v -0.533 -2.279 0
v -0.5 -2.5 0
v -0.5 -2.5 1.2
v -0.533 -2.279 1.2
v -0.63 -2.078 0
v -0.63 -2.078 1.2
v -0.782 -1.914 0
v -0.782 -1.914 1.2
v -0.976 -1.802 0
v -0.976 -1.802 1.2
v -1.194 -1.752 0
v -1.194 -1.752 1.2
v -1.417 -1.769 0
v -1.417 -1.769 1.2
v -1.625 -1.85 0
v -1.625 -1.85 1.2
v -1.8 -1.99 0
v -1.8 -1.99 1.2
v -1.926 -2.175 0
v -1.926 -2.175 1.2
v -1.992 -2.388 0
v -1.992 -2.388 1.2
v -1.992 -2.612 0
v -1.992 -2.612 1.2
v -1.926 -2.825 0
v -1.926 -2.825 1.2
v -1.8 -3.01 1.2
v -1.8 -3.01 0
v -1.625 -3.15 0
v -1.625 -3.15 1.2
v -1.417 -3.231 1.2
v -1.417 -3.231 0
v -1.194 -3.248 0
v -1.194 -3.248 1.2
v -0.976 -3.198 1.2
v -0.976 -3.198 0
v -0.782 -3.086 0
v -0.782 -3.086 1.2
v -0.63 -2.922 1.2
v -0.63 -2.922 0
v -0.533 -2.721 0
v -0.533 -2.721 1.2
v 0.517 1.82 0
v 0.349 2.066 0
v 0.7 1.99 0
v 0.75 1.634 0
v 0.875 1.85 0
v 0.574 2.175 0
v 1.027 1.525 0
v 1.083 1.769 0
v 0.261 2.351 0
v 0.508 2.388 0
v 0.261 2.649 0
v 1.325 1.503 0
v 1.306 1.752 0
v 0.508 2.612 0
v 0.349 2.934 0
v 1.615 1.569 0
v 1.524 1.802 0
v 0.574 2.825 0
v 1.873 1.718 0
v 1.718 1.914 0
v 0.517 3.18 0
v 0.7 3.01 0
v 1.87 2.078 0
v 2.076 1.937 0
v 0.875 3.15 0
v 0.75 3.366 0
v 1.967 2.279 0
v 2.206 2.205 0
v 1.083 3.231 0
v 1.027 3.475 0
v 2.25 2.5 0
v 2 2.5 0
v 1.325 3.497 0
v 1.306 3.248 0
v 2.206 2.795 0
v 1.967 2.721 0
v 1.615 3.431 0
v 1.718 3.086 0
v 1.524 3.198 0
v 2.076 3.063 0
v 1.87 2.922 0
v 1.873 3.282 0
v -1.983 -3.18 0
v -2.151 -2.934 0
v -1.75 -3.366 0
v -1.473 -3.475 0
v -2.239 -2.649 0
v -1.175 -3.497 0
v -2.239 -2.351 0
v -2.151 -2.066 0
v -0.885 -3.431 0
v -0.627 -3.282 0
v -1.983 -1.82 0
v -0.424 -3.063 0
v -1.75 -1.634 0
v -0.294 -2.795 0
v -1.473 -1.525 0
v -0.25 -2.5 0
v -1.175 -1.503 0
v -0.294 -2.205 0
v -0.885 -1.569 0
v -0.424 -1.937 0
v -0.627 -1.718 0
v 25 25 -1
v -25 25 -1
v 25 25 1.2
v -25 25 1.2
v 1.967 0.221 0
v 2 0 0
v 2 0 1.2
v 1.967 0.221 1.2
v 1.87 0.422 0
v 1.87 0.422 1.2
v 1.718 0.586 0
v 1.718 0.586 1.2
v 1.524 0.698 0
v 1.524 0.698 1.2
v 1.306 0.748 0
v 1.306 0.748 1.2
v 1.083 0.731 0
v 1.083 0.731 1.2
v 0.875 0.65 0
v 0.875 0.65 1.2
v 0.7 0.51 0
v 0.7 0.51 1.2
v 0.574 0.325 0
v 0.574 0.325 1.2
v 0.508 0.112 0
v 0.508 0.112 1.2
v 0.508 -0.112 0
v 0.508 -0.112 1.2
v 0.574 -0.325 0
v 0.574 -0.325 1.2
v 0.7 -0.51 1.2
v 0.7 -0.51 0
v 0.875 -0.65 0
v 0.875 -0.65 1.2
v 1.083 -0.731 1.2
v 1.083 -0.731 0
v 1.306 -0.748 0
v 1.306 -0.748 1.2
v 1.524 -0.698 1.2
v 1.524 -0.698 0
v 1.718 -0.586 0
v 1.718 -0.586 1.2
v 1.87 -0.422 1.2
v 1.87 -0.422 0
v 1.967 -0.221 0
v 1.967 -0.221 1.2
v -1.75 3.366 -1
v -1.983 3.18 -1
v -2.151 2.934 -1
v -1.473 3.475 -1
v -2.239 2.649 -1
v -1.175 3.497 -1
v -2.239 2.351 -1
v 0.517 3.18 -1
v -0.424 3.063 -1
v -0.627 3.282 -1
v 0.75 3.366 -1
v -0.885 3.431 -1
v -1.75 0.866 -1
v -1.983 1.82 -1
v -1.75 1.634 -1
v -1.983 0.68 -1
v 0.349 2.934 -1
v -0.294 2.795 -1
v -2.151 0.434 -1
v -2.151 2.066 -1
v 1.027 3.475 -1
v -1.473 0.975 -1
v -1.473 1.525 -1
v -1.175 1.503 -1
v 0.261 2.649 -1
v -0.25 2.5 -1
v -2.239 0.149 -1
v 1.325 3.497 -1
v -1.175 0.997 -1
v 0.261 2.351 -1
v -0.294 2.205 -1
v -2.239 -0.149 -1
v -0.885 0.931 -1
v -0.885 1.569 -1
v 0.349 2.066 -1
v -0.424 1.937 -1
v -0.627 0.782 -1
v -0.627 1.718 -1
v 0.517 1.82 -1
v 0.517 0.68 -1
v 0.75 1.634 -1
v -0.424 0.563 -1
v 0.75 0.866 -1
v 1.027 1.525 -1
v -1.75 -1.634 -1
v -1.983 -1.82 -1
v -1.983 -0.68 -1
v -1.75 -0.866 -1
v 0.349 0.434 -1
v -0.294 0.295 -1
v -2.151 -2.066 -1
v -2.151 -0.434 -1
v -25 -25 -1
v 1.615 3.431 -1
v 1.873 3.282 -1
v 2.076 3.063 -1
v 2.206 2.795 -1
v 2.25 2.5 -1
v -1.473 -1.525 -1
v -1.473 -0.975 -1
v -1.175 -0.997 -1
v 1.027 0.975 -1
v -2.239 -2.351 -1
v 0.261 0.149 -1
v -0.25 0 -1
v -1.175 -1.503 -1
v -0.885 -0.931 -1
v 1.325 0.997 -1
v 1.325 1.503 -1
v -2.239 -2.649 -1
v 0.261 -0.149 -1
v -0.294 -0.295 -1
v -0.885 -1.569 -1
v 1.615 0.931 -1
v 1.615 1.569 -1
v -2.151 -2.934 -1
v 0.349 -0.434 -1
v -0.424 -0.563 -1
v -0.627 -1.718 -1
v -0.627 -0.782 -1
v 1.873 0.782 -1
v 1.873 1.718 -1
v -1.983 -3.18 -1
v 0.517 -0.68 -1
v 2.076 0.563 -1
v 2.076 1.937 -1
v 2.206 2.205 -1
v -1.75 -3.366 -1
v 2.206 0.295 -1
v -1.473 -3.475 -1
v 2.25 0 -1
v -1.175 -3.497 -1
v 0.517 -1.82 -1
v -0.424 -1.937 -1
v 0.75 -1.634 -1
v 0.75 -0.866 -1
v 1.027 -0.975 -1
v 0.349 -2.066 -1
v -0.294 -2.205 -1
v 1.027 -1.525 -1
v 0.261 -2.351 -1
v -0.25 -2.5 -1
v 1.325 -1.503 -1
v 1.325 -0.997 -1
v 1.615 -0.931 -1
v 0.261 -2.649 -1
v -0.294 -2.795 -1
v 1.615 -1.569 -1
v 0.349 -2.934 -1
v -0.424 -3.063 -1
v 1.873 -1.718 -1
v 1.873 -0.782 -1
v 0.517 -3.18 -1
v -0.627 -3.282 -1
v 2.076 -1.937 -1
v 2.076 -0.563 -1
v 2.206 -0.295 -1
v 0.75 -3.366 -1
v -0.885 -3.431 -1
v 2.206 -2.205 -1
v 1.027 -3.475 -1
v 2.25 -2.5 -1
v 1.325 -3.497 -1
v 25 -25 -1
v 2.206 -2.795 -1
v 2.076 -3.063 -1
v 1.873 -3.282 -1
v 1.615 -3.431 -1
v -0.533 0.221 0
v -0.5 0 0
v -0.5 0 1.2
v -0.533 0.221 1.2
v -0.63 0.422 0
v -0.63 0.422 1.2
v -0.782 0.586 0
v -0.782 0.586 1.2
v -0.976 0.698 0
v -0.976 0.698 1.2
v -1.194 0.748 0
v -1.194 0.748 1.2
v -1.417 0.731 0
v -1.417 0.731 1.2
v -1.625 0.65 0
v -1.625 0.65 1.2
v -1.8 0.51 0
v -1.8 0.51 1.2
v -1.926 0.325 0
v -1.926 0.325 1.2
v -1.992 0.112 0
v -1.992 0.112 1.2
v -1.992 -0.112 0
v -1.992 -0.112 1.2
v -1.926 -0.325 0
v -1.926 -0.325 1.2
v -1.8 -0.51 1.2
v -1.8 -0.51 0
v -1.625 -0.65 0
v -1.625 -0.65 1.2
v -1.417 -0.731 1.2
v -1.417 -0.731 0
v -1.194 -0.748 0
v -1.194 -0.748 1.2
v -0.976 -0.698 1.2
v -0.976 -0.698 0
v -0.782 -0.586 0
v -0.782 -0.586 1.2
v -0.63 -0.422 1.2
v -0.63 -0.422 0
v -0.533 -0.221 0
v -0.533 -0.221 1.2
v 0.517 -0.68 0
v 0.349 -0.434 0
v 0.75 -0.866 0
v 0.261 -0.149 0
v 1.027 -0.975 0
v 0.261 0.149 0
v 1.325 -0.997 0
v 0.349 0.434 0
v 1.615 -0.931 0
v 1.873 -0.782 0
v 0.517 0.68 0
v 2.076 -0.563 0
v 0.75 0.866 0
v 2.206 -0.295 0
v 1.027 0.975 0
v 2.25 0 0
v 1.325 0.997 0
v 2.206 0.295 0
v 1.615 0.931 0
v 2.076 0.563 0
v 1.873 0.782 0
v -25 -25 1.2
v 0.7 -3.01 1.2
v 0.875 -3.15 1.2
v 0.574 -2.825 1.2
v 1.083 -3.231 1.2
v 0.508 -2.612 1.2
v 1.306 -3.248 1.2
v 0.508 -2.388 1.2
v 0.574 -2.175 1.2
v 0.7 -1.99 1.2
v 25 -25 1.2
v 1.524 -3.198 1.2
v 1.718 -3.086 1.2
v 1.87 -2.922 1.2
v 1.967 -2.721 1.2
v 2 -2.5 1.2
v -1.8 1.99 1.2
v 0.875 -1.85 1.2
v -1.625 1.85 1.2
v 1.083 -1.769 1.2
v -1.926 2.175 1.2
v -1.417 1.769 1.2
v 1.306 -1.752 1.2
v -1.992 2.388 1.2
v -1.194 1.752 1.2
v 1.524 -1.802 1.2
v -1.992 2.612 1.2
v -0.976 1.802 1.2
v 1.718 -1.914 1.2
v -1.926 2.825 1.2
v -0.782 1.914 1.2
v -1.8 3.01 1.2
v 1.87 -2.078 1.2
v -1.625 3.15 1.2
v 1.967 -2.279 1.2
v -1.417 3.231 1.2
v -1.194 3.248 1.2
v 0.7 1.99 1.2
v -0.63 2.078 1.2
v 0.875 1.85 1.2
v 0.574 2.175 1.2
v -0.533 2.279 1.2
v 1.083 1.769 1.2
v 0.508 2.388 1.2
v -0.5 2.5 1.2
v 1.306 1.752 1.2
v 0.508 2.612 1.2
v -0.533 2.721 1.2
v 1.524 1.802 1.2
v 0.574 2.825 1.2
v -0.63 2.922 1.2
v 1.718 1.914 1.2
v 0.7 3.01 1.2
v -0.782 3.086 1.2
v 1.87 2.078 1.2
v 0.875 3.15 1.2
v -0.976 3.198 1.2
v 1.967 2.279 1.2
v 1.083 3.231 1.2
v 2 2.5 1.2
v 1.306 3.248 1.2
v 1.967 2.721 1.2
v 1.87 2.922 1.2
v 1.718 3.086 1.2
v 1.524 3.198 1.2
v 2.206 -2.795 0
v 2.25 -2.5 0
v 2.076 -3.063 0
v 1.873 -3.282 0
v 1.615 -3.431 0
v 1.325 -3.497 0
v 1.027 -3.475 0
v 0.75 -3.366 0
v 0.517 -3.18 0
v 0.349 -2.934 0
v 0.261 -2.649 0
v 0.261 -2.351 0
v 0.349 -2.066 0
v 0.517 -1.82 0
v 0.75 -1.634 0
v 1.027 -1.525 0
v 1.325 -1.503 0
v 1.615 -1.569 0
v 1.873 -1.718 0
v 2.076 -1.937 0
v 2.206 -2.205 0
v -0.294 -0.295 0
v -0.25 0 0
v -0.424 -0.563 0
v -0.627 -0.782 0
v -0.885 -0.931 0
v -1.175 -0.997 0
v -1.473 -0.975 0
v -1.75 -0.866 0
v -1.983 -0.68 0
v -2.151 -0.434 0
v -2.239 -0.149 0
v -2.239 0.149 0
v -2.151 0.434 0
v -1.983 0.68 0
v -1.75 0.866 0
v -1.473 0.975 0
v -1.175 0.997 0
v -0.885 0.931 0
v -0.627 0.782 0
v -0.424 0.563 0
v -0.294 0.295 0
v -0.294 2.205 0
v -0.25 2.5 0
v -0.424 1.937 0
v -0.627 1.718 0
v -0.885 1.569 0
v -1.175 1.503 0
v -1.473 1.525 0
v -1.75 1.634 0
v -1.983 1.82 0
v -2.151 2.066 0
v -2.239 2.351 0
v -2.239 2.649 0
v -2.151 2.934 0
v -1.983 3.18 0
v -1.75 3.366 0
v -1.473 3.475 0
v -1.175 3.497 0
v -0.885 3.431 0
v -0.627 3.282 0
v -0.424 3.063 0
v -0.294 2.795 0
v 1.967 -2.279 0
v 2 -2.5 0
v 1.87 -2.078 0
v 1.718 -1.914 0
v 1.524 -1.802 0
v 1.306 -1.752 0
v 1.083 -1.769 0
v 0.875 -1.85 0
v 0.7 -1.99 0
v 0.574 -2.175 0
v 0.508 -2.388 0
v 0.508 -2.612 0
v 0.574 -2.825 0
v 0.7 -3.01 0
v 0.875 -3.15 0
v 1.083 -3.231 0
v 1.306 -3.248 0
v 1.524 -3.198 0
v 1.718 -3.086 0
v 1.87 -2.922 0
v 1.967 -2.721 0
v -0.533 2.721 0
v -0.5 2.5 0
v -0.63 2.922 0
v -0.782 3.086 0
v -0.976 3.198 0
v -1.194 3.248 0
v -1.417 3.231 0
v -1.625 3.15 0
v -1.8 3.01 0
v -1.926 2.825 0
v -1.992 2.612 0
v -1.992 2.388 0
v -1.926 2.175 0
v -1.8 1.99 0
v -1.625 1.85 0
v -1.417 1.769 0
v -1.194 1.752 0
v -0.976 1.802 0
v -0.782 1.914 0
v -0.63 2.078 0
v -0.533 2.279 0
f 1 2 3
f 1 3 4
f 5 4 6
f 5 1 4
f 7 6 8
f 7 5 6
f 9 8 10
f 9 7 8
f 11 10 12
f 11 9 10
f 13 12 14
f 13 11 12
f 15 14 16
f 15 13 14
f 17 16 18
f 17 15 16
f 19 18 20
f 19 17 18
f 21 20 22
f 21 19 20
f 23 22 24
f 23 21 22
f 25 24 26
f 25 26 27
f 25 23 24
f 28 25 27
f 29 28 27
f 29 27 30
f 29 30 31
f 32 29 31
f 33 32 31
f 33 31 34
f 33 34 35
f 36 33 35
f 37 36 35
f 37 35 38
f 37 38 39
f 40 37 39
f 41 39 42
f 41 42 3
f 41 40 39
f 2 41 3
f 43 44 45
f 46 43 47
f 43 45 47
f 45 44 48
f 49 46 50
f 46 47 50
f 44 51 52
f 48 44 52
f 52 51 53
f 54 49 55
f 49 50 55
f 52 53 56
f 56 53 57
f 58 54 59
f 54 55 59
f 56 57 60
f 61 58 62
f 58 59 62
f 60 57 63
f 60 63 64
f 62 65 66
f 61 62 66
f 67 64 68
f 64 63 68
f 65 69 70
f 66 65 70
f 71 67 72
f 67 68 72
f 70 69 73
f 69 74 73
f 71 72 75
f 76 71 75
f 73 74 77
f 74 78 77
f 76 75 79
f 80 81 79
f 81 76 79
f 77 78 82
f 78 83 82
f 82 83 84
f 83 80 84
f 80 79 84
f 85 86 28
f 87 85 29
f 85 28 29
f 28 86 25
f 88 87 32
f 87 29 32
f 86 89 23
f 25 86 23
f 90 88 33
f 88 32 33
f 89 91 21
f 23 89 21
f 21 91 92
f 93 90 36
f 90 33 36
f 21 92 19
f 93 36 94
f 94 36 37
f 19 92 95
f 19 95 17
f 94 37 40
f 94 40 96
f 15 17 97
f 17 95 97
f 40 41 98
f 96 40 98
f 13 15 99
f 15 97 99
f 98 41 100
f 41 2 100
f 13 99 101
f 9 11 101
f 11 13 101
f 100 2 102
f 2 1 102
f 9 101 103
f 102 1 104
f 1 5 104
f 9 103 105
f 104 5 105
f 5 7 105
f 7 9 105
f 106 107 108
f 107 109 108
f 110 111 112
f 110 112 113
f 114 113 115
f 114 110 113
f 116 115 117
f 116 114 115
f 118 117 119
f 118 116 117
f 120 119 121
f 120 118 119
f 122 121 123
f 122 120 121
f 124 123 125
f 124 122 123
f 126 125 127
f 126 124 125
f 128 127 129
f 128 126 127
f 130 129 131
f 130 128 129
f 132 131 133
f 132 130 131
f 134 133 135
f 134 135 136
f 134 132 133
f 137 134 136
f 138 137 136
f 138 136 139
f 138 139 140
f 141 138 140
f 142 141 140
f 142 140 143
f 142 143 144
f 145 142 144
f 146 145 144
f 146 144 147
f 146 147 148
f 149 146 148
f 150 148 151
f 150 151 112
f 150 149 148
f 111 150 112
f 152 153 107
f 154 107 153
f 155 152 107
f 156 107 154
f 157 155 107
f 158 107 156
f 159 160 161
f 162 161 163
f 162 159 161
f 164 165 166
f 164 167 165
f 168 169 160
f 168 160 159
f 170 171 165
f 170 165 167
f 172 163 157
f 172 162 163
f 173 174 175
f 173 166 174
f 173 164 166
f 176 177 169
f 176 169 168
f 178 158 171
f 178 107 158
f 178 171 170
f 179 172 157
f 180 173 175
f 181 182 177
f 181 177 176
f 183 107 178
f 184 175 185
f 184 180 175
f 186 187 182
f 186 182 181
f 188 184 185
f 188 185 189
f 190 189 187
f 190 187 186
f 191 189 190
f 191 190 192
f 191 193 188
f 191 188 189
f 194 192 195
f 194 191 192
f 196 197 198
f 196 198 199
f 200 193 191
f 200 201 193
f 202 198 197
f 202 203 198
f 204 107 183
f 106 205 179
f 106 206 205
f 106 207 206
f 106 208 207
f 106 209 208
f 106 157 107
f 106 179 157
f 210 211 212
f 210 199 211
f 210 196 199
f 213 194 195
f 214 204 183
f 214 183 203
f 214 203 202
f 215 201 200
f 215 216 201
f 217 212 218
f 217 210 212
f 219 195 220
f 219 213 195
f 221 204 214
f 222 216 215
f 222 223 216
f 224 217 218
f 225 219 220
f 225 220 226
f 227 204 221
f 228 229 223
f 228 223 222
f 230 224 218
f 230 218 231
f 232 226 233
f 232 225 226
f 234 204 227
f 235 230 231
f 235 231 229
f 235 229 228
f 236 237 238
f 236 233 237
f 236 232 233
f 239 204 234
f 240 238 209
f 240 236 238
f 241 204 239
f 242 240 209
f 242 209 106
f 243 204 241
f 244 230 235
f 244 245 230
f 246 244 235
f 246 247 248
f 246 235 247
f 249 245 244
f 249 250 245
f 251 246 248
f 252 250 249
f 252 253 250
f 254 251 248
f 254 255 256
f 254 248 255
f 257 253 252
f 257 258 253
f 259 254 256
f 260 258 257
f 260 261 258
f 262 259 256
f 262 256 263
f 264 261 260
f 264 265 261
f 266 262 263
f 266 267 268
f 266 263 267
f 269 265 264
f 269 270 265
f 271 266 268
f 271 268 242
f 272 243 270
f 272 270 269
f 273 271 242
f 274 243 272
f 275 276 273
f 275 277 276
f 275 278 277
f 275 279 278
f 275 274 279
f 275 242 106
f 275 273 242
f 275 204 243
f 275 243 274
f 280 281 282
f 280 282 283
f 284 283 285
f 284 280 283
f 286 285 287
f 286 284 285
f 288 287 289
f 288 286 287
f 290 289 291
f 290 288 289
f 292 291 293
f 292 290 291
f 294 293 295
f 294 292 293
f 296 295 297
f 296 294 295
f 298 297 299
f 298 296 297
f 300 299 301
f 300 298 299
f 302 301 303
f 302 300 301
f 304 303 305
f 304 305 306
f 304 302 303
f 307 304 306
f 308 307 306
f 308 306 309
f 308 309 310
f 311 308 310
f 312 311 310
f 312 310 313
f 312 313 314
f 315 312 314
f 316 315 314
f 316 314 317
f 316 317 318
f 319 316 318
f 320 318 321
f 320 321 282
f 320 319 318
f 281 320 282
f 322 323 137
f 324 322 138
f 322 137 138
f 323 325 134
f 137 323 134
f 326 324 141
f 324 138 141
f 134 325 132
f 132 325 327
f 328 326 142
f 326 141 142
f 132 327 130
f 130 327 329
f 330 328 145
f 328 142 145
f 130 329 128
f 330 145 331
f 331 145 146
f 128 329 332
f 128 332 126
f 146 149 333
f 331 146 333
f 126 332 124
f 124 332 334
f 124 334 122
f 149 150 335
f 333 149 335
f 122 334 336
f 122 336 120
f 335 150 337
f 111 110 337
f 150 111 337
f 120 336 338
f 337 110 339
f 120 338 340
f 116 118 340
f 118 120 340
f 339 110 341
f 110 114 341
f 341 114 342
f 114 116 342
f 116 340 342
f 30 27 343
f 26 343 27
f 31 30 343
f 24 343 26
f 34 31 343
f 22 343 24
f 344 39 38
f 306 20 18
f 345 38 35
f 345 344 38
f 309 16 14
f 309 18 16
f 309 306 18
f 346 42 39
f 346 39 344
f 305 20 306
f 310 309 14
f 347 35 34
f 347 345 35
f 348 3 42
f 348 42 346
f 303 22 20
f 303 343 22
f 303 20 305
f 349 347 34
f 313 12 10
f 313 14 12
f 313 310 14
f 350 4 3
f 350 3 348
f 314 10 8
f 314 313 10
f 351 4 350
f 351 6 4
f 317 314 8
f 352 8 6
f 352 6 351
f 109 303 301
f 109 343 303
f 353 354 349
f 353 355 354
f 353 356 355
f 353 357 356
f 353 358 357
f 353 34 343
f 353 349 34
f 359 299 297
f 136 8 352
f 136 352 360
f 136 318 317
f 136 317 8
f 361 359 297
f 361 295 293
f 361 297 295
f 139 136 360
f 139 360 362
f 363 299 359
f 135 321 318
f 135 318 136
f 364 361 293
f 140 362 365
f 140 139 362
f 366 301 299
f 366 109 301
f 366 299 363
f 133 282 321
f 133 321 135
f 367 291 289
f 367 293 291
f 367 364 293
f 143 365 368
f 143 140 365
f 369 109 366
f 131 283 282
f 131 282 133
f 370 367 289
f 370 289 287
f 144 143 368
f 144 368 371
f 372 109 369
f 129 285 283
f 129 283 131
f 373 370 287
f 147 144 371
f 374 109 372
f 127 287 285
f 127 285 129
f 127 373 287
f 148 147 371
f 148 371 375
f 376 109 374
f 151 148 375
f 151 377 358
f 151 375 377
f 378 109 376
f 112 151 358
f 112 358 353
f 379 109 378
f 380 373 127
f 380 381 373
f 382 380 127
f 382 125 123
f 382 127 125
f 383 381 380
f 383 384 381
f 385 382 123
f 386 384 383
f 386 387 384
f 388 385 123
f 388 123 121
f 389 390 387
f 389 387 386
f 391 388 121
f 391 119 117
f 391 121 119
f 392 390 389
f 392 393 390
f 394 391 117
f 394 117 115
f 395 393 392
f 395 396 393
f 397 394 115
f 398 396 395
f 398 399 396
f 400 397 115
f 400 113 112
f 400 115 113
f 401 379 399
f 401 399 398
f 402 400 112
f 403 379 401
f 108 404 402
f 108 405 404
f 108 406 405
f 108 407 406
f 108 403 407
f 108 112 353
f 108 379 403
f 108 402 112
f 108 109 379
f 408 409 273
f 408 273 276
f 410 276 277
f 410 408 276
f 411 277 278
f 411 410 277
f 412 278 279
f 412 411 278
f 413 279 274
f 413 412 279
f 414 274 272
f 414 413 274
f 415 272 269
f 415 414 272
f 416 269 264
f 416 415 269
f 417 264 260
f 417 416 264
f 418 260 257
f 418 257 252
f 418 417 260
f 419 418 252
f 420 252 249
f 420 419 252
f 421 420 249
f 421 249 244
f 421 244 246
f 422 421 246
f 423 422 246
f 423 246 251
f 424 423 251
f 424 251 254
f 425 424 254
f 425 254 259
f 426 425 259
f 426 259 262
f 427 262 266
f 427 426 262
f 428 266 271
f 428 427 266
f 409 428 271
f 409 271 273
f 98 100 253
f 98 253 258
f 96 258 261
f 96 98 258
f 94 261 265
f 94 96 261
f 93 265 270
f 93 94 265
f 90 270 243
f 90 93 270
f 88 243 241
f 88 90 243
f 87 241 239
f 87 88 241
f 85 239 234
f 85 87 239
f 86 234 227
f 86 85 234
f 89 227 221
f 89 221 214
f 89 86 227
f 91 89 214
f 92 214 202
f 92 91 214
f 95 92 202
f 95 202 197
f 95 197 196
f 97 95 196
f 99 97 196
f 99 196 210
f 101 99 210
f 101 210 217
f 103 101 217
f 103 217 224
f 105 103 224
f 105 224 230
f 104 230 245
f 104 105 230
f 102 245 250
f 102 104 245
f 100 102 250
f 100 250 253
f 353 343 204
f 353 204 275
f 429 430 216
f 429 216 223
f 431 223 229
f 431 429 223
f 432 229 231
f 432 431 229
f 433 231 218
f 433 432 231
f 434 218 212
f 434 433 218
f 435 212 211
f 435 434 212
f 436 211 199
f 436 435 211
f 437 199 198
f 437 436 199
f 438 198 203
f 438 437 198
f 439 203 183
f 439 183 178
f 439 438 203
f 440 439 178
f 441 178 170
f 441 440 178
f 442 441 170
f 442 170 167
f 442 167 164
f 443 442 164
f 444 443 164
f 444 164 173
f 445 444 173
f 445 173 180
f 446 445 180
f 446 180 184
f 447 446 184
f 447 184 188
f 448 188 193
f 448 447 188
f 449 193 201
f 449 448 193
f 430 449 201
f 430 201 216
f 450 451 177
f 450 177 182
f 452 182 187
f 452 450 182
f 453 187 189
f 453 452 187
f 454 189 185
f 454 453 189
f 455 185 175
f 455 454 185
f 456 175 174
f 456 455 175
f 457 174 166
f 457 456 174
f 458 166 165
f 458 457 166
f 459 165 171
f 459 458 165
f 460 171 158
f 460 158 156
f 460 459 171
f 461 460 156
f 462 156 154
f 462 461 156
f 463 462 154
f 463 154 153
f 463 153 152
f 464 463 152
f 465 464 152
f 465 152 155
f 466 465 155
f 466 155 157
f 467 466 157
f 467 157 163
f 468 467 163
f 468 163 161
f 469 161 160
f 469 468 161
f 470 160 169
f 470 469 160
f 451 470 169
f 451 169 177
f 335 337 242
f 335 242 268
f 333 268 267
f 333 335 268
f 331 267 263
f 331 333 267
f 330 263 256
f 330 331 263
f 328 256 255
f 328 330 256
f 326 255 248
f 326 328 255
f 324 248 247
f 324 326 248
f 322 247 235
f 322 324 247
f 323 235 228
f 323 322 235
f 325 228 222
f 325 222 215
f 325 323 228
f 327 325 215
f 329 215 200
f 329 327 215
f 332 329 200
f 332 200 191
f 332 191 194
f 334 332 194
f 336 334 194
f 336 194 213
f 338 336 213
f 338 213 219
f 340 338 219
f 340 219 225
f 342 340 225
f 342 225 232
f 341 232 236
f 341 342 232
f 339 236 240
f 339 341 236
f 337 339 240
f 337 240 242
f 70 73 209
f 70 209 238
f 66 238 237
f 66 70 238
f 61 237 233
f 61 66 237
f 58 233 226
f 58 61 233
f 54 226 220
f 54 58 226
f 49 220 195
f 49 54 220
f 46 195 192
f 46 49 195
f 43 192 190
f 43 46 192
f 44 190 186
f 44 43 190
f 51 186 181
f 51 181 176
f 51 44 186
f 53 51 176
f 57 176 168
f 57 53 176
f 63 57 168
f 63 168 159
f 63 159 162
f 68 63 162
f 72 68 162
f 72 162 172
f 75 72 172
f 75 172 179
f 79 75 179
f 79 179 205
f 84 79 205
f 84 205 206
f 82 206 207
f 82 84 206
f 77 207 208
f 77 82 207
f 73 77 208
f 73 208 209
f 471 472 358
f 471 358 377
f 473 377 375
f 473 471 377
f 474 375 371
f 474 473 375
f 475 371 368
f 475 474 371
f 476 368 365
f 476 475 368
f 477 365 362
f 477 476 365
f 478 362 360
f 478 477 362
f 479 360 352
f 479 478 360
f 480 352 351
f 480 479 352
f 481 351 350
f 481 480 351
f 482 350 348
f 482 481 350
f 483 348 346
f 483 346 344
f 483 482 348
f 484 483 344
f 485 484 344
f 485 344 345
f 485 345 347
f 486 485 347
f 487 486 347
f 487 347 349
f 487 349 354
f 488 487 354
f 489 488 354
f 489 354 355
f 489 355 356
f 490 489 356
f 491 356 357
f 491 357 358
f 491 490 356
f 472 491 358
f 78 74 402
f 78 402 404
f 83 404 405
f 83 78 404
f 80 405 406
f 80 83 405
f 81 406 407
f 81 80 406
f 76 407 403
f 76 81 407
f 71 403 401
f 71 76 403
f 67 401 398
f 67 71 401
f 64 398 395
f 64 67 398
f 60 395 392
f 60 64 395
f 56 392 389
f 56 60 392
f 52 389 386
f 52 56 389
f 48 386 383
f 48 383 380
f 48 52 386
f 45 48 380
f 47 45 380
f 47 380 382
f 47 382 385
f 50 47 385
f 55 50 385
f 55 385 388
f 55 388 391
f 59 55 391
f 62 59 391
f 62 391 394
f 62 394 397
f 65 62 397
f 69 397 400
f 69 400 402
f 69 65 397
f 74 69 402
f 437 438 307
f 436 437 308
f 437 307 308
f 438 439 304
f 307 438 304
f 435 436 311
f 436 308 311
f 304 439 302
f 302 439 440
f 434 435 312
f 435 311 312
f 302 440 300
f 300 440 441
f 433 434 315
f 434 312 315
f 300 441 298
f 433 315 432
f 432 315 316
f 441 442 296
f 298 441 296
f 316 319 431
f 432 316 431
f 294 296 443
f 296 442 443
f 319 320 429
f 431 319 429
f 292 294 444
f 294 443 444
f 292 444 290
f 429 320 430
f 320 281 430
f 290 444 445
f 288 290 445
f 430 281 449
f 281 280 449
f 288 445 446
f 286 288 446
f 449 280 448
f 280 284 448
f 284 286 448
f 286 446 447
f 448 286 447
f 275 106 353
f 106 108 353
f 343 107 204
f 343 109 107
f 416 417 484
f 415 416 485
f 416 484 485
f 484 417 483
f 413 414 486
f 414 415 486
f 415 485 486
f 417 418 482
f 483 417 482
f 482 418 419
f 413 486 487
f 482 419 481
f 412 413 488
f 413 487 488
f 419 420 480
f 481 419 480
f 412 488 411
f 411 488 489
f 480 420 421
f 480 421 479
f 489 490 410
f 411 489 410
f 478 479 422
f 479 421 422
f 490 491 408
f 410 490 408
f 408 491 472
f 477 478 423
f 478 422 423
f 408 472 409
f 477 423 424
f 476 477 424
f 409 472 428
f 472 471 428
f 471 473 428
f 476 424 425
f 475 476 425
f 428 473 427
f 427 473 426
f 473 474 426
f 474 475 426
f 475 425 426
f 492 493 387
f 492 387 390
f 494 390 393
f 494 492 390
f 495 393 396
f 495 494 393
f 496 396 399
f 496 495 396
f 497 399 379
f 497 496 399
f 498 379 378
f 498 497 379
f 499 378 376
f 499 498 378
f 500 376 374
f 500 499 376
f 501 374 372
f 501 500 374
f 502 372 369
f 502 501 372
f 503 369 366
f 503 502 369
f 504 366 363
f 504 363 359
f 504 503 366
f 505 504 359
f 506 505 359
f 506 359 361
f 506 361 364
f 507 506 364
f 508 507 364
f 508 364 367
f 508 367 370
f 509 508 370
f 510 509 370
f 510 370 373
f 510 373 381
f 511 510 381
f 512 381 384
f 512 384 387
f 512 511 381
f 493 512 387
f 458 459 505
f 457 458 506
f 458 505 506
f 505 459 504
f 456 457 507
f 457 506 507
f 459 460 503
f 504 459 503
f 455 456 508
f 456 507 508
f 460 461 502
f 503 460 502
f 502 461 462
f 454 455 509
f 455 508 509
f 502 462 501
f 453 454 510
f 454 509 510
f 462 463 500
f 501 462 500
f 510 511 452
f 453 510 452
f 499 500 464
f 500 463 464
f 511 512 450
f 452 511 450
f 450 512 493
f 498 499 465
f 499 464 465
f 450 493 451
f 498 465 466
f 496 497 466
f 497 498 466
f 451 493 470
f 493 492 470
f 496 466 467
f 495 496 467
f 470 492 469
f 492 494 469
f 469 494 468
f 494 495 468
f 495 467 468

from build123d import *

# Parameters (mm, degrees)
F0_W     = 50
F0_H     = 50
F0_R     = 0.75
F1_DEPTH = 1.2
F2_W     = 50
F2_H     = 50
F2_R     = 1
F3_DEPTH = 1


with BuildPart() as f1:
    # F0 (on Top) → F1 (new body)
    with BuildSketch(Plane.XY):
        Rectangle(F0_W, F0_H)
        with Locations((-1.25, -2.5)):
            Circle(F0_R, mode=Mode.SUBTRACT)
        with Locations((1.25, -2.5)):
            Circle(F0_R, mode=Mode.SUBTRACT)
        with Locations((-1.25, 0)):
            Circle(F0_R, mode=Mode.SUBTRACT)
        with Locations((-1.25, 2.5)):
            Circle(F0_R, mode=Mode.SUBTRACT)
        with Locations((1.25, 0)):
            Circle(F0_R, mode=Mode.SUBTRACT)
        with Locations((1.25, 2.5)):
            Circle(F0_R, mode=Mode.SUBTRACT)
    extrude(amount=F1_DEPTH)

    # F2 (on face) → F3 (join)
    with BuildSketch(Plane(origin=(0, 0, 0), x_dir=(1, 0, 0), z_dir=(0, 0, -1))):
        Rectangle(F2_W, F2_H)
        with Locations((-1.25, -2.5)):
            Circle(F2_R, mode=Mode.SUBTRACT)
        with Locations((1.25, -2.5)):
            Circle(F2_R, mode=Mode.SUBTRACT)
        with Locations((-1.25, 0)):
            Circle(F2_R, mode=Mode.SUBTRACT)
        with Locations((-1.25, 2.5)):
            Circle(F2_R, mode=Mode.SUBTRACT)
        with Locations((1.25, 0)):
            Circle(F2_R, mode=Mode.SUBTRACT)
        with Locations((1.25, 2.5)):
            Circle(F2_R, mode=Mode.SUBTRACT)
    extrude(amount=F3_DEPTH)


solid = f1.part
